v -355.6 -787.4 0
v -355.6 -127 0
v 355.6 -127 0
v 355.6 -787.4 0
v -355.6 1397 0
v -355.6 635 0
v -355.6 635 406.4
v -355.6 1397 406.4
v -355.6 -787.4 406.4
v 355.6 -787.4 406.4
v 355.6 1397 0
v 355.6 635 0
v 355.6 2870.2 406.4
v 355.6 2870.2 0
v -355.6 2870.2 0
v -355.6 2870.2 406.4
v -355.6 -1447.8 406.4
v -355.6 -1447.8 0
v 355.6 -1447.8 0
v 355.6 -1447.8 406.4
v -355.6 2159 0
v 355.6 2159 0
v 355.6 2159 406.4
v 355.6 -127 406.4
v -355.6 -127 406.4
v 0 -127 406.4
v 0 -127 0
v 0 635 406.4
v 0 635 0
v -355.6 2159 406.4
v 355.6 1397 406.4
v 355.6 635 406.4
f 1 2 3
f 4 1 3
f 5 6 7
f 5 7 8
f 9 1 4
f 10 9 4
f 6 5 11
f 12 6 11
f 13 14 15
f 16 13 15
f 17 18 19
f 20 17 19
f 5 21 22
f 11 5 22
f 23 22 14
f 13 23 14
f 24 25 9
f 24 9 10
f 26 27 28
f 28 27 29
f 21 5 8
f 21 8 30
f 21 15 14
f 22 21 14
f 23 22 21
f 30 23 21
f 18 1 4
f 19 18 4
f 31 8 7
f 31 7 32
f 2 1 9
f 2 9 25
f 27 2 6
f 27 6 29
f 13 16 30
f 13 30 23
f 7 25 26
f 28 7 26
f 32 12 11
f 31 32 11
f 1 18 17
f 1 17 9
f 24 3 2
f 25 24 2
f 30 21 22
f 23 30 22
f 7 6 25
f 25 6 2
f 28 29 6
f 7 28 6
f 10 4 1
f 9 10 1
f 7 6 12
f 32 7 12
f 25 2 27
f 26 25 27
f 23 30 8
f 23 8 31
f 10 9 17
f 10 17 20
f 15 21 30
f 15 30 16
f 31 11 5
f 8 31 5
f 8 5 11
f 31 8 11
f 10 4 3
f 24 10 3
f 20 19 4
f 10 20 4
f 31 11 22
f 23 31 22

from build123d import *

# Parameters (mm, degrees)
F0_W     = 355.6
F0_H     = 660.4
F1_DEPTH = 406.4
F2_DEPTH = 406.4
F3_DEPTH = 406.4
F0_H_2   = 762
F4_DEPTH = 406.4
F5_DEPTH = 406.4
F0_H_3   = 711.2
F6_DEPTH = 406.4


# Not quite as in the source:
# - the program builds the solid bodies; features that only make, move or delete a surface that nothing else refers to are left out


with BuildPart() as f1:
    # F0 (on Top) → F1 (new body)
    with BuildSketch(Plane.XY):
        with Locations((-177.8, -1117.6)):
            Rectangle(F0_W, F0_H)
        with Locations((177.8, -1117.6)):
            Rectangle(F0_W, F0_H)
    extrude(amount=F1_DEPTH)


with BuildPart() as f2:
    # F0 (on Top) → F2 (new body)
    with BuildSketch(Plane.XY):
        with Locations((-177.8, -457.2)):
            Rectangle(F0_W, F0_H)
        with Locations((177.8, -457.2)):
            Rectangle(F0_W, F0_H)
    extrude(amount=F2_DEPTH)


with BuildPart() as f3:
    # F0 (on Top) → F3 (new body)
    with BuildSketch(Plane.XY):
        Polygon((0, 635), (-355.6, 635), (-355.6, 0), (-355.6, -127), (0, -127), align=None)
    extrude(amount=F3_DEPTH)


with BuildPart() as f4:
    # F0 (on Top) → F4 (new body)
    with BuildSketch(Plane.XY):
        with Locations((-177.8, 1016)):
            Rectangle(F0_W, F0_H_2)
        with Locations((177.8, 1016)):
            Rectangle(F0_W, F0_H_2)
    extrude(amount=F4_DEPTH)


with BuildPart() as f5:
    # F0 (on Top) → F5 (new body)
    with BuildSketch(Plane.XY):
        with Locations((-177.8, 1778)):
            Rectangle(F0_W, F0_H_2)
        with Locations((177.8, 1778)):
            Rectangle(F0_W, F0_H_2)
    extrude(amount=F5_DEPTH)


with BuildPart() as f6:
    # F0 (on Top) → F6 (new body)
    with BuildSketch(Plane.XY):
        with Locations((-177.8, 2514.6)):
            Rectangle(F0_W, F0_H_3)
        with Locations((177.8, 2514.6)):
            Rectangle(F0_W, F0_H_3)
    extrude(amount=F6_DEPTH)


solid = Compound([f1.part, f2.part, f3.part, f4.part, f5.part, f6.part])
